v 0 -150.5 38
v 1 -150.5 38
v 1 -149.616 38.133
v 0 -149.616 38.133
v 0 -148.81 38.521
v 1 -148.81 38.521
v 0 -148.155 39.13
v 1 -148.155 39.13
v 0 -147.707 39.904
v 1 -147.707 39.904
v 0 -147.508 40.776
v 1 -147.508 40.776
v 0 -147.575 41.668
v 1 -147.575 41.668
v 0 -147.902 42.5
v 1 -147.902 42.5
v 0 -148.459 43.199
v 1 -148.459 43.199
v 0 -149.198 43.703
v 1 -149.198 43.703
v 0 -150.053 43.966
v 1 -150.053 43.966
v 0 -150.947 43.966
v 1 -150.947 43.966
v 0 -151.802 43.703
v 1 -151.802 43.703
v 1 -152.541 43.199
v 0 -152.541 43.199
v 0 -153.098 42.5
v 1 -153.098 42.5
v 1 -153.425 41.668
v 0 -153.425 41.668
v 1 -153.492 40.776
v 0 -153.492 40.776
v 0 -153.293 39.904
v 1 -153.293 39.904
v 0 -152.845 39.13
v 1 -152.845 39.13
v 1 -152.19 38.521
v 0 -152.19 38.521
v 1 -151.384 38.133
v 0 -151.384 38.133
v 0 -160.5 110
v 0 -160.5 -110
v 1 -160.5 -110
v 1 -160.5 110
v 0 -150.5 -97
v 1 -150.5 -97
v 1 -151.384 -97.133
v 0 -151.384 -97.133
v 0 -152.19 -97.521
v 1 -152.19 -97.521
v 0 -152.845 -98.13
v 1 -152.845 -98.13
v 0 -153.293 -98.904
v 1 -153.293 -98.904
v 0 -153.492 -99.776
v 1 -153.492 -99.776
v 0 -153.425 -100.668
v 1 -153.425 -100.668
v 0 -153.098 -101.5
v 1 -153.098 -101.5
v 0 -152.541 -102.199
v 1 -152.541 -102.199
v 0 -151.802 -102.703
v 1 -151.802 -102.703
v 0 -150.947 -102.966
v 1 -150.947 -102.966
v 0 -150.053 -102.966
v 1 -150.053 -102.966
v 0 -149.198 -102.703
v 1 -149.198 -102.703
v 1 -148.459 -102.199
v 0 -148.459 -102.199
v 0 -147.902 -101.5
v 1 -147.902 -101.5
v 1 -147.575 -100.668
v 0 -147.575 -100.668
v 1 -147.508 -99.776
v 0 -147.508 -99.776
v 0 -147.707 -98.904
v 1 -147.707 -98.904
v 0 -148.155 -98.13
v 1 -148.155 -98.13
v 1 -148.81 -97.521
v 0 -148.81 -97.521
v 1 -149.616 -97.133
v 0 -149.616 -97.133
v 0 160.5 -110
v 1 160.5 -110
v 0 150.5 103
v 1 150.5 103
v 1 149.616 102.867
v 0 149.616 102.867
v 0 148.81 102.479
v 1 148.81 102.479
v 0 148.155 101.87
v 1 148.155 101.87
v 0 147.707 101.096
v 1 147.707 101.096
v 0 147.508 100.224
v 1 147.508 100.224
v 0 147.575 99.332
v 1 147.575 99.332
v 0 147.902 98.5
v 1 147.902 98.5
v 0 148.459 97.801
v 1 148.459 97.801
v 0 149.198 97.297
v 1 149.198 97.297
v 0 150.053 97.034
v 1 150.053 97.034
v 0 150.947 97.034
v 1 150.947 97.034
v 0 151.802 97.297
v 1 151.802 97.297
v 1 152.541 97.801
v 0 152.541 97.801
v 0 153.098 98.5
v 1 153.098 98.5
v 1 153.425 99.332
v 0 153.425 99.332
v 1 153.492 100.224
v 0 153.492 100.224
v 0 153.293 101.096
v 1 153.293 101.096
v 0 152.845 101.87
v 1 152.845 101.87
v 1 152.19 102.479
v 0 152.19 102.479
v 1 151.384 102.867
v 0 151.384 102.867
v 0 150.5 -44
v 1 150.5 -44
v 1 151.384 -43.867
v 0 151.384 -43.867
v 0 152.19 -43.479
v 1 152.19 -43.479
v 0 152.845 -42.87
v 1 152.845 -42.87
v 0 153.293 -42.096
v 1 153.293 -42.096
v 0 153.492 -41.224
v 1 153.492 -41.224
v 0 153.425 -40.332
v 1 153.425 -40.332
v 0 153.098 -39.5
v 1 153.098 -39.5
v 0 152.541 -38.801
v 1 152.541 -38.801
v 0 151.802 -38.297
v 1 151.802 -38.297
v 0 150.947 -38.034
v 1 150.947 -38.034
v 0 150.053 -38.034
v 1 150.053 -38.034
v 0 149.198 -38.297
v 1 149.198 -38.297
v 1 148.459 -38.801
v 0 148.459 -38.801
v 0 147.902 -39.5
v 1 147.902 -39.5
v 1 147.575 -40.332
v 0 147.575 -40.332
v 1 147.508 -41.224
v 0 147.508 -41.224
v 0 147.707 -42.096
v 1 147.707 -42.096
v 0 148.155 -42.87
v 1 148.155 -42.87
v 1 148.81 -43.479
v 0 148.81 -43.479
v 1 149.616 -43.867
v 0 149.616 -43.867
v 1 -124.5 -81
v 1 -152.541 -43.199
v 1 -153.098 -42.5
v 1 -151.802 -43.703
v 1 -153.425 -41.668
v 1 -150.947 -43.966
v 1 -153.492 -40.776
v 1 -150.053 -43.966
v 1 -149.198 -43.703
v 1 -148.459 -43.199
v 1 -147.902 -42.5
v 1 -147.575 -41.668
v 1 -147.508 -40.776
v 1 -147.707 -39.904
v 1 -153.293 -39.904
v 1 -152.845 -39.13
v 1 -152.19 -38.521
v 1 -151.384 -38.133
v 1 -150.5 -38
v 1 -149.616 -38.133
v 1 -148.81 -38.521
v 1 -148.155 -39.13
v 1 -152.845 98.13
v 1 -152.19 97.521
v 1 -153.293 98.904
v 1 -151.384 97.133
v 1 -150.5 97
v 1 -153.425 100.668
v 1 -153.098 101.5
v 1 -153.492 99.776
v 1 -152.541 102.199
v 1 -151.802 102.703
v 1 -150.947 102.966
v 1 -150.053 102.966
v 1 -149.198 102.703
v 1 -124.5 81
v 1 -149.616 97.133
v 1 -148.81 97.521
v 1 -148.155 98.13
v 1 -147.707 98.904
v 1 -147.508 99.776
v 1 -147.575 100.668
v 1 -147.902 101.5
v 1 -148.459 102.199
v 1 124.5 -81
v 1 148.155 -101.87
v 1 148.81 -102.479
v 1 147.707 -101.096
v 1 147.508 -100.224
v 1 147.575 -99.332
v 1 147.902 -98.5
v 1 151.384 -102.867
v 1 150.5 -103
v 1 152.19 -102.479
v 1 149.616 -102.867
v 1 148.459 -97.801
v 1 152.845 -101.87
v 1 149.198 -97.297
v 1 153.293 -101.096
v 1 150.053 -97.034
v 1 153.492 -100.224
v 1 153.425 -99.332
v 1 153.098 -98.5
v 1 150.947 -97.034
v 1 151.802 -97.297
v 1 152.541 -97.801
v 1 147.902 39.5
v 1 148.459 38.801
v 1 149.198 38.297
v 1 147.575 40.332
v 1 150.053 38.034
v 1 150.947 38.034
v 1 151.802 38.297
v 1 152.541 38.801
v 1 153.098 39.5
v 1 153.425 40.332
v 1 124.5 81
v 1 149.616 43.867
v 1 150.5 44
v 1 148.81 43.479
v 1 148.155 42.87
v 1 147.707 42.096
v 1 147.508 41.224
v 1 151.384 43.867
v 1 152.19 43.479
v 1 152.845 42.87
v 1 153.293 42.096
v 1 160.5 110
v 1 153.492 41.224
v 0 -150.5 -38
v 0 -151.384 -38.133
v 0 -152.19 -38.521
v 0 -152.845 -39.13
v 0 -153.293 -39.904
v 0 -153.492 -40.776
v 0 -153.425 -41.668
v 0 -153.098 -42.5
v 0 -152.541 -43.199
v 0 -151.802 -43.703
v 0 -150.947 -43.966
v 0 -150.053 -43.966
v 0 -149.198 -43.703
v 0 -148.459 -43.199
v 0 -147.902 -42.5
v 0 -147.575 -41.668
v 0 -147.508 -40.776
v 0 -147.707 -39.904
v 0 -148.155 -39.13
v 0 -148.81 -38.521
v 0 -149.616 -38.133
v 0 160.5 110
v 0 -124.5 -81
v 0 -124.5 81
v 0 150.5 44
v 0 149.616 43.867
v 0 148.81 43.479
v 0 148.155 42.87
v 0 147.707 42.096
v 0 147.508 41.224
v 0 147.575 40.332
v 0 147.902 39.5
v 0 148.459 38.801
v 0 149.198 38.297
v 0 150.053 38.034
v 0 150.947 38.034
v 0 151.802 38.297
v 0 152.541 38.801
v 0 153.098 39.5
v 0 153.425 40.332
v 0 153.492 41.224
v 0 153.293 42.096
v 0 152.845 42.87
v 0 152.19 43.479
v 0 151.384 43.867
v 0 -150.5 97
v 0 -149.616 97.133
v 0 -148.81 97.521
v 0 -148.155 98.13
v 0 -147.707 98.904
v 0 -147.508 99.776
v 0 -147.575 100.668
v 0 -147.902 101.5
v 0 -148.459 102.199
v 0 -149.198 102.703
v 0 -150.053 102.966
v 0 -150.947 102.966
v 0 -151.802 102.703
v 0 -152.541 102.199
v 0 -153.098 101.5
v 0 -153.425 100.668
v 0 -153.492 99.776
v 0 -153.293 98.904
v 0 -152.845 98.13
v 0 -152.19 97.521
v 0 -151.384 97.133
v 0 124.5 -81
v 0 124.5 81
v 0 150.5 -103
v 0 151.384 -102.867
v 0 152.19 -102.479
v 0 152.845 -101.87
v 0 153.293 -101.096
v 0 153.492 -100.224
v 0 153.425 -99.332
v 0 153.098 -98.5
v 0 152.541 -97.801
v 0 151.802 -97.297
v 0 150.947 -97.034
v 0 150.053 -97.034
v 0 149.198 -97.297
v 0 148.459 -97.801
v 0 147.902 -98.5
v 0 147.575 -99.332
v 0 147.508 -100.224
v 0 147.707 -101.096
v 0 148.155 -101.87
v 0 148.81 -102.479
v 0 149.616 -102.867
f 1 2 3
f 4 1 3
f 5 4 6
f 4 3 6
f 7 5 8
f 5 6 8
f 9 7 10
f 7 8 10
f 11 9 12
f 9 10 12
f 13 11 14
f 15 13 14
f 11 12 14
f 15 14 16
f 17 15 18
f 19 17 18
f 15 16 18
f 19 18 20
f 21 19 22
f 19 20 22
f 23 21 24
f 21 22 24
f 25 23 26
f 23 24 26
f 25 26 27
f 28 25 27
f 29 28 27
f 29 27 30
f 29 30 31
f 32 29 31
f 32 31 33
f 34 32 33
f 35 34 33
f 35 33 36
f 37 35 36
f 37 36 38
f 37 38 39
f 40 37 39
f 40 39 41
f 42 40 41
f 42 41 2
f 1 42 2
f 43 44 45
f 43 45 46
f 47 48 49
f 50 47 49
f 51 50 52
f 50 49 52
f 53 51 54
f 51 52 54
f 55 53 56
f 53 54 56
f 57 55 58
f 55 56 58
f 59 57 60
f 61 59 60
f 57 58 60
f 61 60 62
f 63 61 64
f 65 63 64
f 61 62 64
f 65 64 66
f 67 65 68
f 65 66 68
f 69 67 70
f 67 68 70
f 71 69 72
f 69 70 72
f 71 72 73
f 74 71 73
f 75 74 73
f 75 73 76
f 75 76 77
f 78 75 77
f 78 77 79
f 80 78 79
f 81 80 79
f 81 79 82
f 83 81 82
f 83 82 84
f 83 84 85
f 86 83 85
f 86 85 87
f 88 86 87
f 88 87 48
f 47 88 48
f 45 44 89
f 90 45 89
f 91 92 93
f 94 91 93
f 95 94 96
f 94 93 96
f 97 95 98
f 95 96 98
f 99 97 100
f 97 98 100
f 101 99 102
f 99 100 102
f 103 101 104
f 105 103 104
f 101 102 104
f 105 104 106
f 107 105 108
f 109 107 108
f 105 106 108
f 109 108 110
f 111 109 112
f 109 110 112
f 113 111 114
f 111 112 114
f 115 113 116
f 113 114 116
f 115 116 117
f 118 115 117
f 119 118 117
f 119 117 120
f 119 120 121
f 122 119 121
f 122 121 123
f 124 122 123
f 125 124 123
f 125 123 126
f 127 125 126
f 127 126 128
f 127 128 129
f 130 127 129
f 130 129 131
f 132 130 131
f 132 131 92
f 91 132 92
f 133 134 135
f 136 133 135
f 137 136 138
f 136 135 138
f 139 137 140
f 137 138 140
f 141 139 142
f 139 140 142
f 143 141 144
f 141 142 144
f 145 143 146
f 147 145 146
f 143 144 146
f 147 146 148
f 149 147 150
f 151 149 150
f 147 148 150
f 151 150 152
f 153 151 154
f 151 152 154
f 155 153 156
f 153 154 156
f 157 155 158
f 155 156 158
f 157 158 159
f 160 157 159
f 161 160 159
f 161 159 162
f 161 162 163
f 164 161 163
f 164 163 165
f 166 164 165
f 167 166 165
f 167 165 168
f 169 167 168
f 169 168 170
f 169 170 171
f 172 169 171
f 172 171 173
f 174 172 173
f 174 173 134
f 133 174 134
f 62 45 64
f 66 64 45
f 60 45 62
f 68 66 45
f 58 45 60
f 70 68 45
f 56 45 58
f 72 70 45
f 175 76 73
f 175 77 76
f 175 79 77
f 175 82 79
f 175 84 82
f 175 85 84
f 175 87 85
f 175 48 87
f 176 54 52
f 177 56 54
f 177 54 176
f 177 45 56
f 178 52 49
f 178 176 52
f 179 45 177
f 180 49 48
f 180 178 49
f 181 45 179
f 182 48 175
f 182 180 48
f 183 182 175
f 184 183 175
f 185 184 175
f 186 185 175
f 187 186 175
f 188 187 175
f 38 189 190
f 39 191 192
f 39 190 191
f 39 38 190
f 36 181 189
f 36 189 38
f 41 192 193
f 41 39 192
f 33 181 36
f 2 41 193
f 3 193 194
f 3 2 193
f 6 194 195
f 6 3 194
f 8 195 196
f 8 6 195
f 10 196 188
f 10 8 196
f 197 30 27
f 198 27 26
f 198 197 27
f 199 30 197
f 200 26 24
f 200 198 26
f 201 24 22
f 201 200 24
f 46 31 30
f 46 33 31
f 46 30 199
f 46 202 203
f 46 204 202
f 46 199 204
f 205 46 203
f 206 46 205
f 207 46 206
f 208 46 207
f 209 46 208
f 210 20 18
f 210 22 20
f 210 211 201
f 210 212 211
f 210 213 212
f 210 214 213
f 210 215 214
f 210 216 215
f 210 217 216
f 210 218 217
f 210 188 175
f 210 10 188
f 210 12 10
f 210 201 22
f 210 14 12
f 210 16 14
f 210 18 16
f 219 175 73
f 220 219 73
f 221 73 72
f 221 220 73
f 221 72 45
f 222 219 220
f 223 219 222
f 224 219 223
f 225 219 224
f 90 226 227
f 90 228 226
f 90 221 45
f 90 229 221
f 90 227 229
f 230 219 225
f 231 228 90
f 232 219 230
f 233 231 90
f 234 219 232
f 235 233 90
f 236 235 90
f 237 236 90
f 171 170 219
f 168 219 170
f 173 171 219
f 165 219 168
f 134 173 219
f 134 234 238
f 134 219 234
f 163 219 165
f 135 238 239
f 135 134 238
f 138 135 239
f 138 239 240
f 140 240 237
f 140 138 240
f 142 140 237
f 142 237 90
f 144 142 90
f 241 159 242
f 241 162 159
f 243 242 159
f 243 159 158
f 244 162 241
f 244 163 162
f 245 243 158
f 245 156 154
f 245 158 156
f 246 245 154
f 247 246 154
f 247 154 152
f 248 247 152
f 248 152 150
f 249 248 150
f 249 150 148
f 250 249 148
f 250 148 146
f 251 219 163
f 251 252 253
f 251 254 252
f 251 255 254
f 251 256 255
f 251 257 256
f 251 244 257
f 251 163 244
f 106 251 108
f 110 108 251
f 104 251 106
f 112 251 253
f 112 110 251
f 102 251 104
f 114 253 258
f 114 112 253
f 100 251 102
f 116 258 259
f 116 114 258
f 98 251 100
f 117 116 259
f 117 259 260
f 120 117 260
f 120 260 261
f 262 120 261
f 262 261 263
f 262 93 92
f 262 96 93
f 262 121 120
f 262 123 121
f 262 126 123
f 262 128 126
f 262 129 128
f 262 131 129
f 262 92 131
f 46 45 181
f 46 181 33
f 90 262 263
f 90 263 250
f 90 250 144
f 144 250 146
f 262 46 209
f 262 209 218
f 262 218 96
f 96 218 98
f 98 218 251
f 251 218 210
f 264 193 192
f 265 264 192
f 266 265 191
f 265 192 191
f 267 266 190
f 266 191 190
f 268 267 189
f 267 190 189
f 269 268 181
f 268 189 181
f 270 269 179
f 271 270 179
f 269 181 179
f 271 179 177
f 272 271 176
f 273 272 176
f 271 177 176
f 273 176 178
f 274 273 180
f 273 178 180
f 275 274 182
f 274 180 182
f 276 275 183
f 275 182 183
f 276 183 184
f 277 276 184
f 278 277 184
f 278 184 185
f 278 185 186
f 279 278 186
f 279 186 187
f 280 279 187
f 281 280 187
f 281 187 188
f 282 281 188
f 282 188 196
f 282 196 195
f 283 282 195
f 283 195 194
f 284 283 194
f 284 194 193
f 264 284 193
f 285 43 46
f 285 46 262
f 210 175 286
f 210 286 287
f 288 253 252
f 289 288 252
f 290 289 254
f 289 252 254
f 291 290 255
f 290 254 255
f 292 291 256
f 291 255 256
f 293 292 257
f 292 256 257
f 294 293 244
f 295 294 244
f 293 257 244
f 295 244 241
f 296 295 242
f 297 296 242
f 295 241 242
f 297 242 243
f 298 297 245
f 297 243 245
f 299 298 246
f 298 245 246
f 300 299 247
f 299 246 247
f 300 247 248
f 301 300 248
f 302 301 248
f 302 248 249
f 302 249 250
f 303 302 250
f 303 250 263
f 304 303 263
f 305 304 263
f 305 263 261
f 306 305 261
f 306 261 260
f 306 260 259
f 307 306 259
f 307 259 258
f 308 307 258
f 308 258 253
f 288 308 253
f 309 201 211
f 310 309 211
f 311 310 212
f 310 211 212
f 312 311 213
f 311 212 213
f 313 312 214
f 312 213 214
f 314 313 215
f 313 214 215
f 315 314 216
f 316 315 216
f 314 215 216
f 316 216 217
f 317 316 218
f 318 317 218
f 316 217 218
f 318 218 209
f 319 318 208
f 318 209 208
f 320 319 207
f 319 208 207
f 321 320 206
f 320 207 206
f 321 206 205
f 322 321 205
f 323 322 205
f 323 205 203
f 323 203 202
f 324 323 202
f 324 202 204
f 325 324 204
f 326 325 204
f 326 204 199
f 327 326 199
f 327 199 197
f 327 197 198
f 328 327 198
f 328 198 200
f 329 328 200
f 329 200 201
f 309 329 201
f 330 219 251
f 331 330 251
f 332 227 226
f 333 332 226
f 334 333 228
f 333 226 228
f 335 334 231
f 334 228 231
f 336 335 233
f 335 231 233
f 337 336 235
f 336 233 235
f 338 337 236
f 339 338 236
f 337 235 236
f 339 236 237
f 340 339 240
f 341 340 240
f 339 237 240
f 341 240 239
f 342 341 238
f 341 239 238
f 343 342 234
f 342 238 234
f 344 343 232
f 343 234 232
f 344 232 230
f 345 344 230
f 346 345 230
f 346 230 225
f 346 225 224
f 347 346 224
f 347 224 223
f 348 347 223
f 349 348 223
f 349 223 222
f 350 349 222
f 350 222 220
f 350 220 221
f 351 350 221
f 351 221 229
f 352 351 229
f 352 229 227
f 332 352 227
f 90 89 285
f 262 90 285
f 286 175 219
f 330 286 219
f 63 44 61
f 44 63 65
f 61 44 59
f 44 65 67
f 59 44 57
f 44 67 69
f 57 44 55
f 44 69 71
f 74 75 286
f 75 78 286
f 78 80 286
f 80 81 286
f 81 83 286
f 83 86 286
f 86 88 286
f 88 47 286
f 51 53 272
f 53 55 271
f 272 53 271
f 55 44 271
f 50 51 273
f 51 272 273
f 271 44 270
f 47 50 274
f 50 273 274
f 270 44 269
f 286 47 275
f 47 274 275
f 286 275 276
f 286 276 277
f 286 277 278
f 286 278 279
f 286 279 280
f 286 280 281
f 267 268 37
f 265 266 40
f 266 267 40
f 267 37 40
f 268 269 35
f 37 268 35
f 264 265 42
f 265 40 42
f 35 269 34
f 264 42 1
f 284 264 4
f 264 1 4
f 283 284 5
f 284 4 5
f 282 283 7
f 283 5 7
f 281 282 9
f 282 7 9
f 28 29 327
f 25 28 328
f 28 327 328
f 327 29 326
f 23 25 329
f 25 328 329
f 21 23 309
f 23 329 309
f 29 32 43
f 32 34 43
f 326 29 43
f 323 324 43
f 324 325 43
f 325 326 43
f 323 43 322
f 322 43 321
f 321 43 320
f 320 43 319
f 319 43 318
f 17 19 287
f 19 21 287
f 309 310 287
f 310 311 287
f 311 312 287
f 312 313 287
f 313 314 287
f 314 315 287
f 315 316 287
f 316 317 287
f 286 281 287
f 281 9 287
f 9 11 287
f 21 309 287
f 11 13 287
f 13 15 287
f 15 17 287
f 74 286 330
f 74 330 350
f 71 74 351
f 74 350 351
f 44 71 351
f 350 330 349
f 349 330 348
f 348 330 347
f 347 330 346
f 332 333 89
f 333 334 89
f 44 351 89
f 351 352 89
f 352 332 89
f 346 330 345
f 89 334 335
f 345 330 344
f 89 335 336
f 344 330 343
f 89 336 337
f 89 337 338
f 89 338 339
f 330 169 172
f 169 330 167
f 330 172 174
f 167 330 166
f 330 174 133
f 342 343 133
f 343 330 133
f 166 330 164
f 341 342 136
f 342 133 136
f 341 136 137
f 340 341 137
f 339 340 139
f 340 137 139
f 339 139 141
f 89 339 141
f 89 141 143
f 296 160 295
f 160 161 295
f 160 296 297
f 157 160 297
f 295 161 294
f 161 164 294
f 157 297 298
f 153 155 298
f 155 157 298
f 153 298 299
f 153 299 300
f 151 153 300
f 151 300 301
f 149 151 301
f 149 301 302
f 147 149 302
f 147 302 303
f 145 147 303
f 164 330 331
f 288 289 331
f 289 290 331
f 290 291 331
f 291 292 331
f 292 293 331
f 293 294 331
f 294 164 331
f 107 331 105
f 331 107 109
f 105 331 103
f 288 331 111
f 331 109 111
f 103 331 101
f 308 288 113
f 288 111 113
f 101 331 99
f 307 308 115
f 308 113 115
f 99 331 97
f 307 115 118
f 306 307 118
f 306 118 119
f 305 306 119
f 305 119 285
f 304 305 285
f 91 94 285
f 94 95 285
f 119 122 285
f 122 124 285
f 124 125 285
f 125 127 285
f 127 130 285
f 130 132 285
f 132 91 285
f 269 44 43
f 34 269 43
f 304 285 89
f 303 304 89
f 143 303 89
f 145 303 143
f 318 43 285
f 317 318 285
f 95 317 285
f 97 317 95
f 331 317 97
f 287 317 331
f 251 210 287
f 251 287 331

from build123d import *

# Parameters (mm, degrees)
SKETCH1_W           = 321
SKETCH1_H           = 220
BOSS_EXTRUDE1_DEPTH = 1
SKETCH2_R           = 3
CUT_EXTRUDE1_DEPTH  = 195.579675198
SKETCH3_W           = 249
SKETCH3_H           = 162
CUT_EXTRUDE2_DEPTH  = 195.579675198
SKETCH4_R           = 3
CUT_EXTRUDE3_DEPTH  = 195.579675198


with BuildPart() as part:
    # Sketch1 → Boss-Extrude1 (new body)
    with BuildSketch(Plane.YZ):
        Rectangle(SKETCH1_W, SKETCH1_H)
    extrude(amount=BOSS_EXTRUDE1_DEPTH)

    # Sketch2 → Cut-Extrude1 (cut, through all)
    with BuildSketch(Plane.YZ.offset(1)):
        with Locations(Location((-150.5, 100, 0), (0, 0, 270))):
            Circle(SKETCH2_R)
        with Locations(Location((150.5, 100, 0), (0, 0, 90))):
            Circle(SKETCH2_R)
        with Locations(Location((-150.5, -100, 0), (0, 0, 90))):
            Circle(SKETCH2_R)
        with Locations(Location((150.5, -100, 0), (0, 0, 270))):
            Circle(SKETCH2_R)
    extrude(amount=-CUT_EXTRUDE1_DEPTH, mode=Mode.SUBTRACT)

    # Sketch3 → Cut-Extrude2 (cut, through all)
    with BuildSketch(Plane.YZ.offset(1)):
        Rectangle(SKETCH3_W, SKETCH3_H)
    extrude(amount=-CUT_EXTRUDE2_DEPTH, mode=Mode.SUBTRACT)

    # Sketch4 → Cut-Extrude3 (cut, through all)
    with BuildSketch(Plane.YZ.offset(1)):
        with Locations(Location((-150.5, 41, 0), (0, 0, 270))):
            Circle(SKETCH4_R)
        with Locations(Location((150.5, 41, 0), (0, 0, 90))):
            Circle(SKETCH4_R)
        with Locations(Location((-150.5, -41, 0), (0, 0, 90))):
            Circle(SKETCH4_R)
        with Locations(Location((150.5, -41, 0), (0, 0, 270))):
            Circle(SKETCH4_R)
    extrude(amount=-CUT_EXTRUDE3_DEPTH, mode=Mode.SUBTRACT)


solid = part.part
